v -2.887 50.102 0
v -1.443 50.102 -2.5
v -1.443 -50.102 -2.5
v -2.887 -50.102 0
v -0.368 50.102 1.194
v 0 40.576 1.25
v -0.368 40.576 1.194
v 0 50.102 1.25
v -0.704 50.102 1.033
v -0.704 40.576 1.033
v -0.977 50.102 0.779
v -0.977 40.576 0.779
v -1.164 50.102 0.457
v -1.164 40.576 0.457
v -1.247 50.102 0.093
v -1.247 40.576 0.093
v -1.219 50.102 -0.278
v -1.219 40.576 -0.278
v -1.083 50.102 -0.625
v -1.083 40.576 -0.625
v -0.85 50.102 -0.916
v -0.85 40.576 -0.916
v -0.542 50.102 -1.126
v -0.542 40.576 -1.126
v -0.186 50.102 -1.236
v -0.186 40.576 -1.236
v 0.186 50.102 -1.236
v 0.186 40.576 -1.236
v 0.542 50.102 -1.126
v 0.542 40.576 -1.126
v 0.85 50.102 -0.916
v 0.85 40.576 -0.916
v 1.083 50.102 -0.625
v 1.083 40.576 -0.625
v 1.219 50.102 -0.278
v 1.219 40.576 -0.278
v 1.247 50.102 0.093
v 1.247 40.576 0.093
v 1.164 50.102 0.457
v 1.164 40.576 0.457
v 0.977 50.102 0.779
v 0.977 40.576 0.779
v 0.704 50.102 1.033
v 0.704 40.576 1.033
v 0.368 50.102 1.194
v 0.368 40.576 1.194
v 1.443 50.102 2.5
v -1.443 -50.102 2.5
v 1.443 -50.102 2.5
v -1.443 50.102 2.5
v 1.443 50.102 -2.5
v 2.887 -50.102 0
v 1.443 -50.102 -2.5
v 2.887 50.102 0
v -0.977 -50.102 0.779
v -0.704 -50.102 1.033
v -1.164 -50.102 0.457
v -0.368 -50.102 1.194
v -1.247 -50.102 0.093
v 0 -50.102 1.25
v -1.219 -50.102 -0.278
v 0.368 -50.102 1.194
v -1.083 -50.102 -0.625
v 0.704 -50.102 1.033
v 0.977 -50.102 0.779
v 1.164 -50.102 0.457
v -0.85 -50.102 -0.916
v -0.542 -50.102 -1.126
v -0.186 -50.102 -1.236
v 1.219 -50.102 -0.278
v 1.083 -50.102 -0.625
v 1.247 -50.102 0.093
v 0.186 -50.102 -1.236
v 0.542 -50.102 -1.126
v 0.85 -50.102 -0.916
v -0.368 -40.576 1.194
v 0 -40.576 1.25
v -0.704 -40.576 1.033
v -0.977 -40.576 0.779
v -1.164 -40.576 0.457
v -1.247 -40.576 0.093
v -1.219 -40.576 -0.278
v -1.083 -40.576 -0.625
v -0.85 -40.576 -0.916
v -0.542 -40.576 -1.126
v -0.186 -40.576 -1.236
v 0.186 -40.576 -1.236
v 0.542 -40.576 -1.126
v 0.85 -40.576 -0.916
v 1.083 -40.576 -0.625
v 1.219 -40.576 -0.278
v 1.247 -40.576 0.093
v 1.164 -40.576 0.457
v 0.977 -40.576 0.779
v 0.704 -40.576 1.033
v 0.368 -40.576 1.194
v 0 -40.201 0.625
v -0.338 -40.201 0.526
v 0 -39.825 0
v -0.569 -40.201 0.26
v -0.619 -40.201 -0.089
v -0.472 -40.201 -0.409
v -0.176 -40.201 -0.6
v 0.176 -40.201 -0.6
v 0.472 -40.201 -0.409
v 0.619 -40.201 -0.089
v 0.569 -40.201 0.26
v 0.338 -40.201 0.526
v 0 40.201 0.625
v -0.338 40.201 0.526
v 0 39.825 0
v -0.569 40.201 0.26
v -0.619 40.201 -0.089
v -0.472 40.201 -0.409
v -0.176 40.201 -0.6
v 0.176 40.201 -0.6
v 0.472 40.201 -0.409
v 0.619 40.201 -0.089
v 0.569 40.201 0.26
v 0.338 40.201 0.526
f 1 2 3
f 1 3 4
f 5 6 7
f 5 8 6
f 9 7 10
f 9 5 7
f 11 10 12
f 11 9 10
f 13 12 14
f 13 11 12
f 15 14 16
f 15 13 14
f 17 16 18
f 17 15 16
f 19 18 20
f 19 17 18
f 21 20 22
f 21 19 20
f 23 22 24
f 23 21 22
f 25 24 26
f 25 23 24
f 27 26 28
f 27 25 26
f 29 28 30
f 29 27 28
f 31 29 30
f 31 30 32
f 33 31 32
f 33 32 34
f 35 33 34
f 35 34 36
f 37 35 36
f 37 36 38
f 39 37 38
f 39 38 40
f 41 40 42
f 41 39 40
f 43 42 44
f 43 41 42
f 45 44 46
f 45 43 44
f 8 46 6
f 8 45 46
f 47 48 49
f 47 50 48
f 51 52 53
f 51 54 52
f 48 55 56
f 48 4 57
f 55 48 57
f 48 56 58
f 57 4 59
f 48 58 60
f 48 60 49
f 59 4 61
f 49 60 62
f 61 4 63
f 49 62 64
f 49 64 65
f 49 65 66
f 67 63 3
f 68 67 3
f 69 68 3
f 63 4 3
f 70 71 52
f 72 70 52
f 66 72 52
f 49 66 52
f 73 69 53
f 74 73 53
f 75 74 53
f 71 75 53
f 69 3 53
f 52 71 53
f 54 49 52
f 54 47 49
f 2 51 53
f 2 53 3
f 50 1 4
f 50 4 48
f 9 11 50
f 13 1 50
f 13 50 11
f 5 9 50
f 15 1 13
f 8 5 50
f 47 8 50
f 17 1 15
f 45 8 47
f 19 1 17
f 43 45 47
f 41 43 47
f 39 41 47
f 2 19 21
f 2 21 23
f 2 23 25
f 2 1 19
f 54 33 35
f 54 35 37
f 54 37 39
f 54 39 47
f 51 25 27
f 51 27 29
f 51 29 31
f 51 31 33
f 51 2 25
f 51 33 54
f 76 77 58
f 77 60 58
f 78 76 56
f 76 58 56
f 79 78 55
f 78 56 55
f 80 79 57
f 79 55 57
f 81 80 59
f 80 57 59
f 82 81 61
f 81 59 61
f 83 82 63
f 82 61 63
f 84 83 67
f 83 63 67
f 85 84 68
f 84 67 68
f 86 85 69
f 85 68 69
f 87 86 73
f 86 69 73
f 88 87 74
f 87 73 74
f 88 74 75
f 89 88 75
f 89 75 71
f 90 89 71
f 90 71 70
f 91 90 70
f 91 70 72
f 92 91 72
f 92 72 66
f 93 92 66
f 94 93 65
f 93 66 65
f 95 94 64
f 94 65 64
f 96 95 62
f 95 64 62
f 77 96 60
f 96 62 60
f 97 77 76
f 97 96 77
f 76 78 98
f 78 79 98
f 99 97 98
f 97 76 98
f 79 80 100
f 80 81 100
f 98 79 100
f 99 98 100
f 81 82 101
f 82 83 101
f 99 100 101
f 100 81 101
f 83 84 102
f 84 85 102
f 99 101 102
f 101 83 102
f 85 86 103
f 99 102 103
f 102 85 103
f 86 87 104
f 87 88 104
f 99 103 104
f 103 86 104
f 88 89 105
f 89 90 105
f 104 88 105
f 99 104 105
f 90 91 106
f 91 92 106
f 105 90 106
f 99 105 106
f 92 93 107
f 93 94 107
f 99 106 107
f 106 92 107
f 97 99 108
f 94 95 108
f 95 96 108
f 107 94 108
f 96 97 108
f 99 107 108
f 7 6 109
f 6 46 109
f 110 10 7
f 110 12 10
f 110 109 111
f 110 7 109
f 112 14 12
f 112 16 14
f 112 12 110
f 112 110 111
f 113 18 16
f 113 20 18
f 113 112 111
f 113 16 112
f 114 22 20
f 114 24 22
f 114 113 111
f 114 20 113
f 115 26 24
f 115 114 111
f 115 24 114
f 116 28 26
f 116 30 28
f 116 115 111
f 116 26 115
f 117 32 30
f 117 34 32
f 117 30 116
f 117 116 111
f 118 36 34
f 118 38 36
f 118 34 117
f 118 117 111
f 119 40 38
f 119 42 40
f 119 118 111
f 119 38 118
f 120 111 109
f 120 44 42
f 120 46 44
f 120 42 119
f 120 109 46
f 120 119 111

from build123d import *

# Parameters (mm, degrees)
BOSS_EXTRUDE1_DEPTH = 50.1015


with BuildPart() as part:
    # Sketch1 → Boss-Extrude1 (new, symmetric)
    with BuildSketch(Plane(origin=(0, 0, 0), x_dir=(1, 0, 0), z_dir=(0, 1, 0))):
        Polygon((2.886751346, 0), (1.443375673, 2.5), (-1.443375673, 2.5), (-2.886751346, 0), (-1.443375673, -2.5), (1.443375673, -2.5), align=None)
    extrude(amount=BOSS_EXTRUDE1_DEPTH, both=True)

    # Sketch3 → M3x0.5 Tapped Hole1 (revolve, cut)
    with BuildSketch(Plane(origin=(0, 50.1015, 0), x_dir=(0, 0, 1), z_dir=(1, 0, 0))):
        Polygon((0, 0), (0, 10.276075774), (1.25, 9.525), (1.25, 0), align=None)
    m3x0_5_tapped_hole1 = revolve(axis=Axis((0, 56.4515, 0), (0, -1, 0)), mode=Mode.SUBTRACT)

    # Mirror1: M3x0.5 Tapped Hole1 across plane
    add(m3x0_5_tapped_hole1.mirror(Plane.ZX), mode=Mode.SUBTRACT)


solid = part.part
